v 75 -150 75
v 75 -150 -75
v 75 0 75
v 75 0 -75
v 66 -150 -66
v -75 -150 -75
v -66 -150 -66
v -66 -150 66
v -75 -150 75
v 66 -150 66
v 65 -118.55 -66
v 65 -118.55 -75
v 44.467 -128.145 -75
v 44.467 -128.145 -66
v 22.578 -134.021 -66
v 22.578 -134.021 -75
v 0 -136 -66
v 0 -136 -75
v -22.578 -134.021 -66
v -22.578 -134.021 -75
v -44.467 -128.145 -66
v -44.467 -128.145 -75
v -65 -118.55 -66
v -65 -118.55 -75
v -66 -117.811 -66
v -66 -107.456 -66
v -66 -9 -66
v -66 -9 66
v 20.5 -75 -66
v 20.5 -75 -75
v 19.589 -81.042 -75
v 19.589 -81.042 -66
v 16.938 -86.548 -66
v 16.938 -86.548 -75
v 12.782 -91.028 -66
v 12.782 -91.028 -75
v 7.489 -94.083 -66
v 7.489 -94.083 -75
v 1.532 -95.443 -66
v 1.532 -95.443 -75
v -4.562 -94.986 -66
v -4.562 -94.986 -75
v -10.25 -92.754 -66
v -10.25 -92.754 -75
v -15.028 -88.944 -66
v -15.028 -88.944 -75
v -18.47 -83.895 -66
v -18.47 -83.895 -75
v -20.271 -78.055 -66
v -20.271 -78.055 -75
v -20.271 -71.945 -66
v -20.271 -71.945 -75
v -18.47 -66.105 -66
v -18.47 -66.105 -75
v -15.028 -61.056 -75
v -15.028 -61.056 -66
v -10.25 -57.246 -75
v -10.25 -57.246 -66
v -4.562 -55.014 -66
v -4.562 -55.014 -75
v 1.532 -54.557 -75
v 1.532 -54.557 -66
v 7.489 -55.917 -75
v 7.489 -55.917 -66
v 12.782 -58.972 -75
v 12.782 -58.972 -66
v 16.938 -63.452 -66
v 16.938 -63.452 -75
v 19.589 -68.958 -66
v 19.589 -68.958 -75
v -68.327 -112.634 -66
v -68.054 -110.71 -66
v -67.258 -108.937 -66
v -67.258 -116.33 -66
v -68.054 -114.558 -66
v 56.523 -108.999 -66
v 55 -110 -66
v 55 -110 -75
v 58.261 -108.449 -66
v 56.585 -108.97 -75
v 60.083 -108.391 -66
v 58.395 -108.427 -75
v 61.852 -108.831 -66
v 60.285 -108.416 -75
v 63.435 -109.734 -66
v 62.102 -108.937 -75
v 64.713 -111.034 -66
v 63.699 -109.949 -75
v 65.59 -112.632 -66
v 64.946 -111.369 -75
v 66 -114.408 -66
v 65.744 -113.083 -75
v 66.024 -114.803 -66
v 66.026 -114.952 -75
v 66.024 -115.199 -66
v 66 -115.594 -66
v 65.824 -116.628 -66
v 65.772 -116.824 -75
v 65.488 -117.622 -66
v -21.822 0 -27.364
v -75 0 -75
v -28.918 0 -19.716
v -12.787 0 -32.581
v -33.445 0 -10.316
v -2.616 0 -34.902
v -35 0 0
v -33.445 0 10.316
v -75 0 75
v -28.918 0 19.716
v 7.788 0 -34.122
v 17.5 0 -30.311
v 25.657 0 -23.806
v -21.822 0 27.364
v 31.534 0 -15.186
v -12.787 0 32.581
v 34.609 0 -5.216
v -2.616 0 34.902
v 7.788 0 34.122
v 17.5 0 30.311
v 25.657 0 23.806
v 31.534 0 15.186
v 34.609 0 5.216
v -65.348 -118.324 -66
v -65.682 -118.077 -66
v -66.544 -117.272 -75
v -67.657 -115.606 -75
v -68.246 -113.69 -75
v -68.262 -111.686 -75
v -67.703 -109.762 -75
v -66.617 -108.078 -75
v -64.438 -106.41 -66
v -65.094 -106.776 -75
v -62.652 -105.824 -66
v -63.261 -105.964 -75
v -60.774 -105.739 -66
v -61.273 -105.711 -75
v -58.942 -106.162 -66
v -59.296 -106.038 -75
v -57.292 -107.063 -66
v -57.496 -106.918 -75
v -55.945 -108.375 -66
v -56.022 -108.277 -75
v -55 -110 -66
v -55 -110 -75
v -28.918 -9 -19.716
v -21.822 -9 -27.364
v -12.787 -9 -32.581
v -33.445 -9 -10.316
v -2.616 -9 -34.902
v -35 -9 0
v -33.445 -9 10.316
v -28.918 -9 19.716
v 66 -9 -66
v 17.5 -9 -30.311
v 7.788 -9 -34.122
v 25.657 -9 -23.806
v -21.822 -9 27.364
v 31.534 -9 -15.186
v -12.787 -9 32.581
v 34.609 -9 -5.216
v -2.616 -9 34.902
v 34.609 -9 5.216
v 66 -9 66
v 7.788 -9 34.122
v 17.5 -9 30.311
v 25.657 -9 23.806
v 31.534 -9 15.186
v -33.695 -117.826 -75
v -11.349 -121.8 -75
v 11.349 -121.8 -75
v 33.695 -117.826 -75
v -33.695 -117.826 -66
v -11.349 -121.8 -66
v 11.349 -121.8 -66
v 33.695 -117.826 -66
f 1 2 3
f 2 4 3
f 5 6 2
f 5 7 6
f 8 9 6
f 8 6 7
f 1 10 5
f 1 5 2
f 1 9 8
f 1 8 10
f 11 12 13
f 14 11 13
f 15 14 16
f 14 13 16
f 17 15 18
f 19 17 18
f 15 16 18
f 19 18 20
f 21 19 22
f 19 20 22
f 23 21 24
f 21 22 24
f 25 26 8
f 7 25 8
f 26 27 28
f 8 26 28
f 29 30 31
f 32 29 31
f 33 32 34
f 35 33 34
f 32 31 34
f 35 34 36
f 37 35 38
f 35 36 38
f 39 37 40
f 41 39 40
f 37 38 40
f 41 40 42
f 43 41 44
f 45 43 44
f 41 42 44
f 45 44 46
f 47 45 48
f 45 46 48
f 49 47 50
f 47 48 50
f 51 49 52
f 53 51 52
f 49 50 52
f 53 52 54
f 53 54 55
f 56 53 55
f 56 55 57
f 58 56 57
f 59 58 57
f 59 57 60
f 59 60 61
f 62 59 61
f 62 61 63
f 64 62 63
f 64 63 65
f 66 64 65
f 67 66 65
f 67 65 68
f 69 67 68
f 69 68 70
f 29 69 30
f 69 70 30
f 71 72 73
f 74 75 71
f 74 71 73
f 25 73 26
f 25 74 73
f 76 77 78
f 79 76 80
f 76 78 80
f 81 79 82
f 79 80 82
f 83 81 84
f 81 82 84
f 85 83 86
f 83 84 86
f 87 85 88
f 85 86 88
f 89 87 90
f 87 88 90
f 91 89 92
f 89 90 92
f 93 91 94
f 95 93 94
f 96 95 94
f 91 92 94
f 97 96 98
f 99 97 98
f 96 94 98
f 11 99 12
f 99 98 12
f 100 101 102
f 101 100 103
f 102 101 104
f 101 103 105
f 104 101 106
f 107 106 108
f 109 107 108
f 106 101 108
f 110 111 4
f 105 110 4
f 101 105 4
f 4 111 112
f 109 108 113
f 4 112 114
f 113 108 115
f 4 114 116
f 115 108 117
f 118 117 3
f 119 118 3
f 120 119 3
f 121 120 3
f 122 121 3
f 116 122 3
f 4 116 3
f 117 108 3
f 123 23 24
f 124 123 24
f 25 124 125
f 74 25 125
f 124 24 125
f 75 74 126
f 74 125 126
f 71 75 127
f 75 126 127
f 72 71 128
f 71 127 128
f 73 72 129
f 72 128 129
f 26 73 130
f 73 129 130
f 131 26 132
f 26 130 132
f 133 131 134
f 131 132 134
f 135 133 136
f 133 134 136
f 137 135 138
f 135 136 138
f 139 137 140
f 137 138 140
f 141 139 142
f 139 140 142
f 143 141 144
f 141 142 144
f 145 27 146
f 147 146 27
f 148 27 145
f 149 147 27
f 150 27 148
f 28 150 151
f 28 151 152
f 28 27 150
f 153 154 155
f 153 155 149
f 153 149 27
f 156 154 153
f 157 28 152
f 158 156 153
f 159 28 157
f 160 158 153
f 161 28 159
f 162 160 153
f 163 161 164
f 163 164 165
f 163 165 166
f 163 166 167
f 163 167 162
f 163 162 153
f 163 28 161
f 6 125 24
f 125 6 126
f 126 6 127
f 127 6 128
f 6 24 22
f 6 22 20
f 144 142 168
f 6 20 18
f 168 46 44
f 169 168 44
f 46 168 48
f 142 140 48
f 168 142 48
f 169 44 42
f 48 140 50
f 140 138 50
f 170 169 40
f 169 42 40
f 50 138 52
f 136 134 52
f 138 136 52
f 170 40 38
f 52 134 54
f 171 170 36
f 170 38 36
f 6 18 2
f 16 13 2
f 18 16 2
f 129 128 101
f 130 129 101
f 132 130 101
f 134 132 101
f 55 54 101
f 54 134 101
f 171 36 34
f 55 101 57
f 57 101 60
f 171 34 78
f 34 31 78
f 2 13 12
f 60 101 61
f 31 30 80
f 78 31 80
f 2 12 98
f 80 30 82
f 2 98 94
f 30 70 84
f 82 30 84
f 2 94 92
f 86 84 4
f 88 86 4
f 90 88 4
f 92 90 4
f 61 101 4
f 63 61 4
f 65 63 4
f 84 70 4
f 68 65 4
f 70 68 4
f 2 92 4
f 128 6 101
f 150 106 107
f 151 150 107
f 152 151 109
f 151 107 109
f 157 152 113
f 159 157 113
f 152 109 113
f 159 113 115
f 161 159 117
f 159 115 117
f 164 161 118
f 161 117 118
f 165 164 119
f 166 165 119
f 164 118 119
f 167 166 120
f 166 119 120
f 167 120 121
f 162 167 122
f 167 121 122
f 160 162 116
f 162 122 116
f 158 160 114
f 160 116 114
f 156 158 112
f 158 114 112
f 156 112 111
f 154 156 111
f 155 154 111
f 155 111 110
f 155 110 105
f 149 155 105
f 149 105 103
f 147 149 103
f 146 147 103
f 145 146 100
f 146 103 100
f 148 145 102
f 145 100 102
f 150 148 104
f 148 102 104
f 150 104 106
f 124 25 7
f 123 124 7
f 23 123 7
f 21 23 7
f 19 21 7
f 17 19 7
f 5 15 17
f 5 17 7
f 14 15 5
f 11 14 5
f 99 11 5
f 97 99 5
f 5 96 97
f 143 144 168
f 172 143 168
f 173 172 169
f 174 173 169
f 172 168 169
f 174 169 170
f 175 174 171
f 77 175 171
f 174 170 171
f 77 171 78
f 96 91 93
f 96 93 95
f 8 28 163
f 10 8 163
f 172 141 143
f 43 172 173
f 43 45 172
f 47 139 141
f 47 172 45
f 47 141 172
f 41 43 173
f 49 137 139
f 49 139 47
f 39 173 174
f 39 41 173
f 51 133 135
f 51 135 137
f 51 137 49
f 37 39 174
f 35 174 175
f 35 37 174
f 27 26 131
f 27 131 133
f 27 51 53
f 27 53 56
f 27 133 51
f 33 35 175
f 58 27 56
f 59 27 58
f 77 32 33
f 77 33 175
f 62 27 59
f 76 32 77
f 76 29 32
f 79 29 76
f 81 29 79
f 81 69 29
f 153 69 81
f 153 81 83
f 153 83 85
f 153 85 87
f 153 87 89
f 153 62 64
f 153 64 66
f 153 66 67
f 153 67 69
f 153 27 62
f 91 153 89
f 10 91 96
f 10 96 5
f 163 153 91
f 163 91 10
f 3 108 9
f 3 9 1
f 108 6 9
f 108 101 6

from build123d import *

# Parameters (mm, degrees)
F0_W     = 150
F0_H     = 150
F1_DEPTH = 9
F2_W     = 150
F2_H     = 150
F2_W_2   = 132
F2_H_2   = 132
F3_DEPTH = 141
F4_R     = 20.5
F5_DEPTH = 9
F6_R     = 35
F7_DEPTH = 9
F9_DEPTH = 9


with BuildPart() as f1:
    # F0 (on Front) → F1 (new body)
    with BuildSketch(Plane.XZ):
        Rectangle(F0_W, F0_H)
    extrude(amount=F1_DEPTH)

    # F2 (on face) → F3 (join)
    with BuildSketch(Plane.XZ.offset(9)):
        Rectangle(F2_W, F2_H)
        Rectangle(F2_W_2, F2_H_2, mode=Mode.SUBTRACT)
    extrude(amount=F3_DEPTH)

    # F4 (on face) → F5 (cut, through all)
    with BuildSketch(Plane(origin=(0, 0, -75), x_dir=(1, 0, 0), z_dir=(0, 0, -1))):
        with Locations((0, 75)):
            Circle(F4_R)
    extrude(amount=-F5_DEPTH, mode=Mode.SUBTRACT)

    # F6 (on face) → F7 (cut, through all)
    with BuildSketch(Plane(origin=(0, 0, 0), x_dir=(-1, 0, 0), z_dir=(0, 1, 0))):
        Circle(F6_R)
    extrude(amount=-F7_DEPTH, mode=Mode.SUBTRACT)

    # F8 (on face) → F9 (cut, through all)
    with BuildSketch(Plane(origin=(0, 0, -75), x_dir=(1, 0, 0), z_dir=(0, 0, -1))):
        with BuildLine():
            ThreePointArc((55, 110), (63.698903, 109.948769), (65, 118.549972))
            ThreePointArc((65, 118.549972), (0, 136), (-65, 118.549972))
            ThreePointArc((-65, 118.549972), (-65.902612, 107.371324), (-55, 110))
            ThreePointArc((-55, 110), (0, 122.300128), (55, 110))
        make_face()
    extrude(amount=-F9_DEPTH, mode=Mode.SUBTRACT)


solid = f1.part
